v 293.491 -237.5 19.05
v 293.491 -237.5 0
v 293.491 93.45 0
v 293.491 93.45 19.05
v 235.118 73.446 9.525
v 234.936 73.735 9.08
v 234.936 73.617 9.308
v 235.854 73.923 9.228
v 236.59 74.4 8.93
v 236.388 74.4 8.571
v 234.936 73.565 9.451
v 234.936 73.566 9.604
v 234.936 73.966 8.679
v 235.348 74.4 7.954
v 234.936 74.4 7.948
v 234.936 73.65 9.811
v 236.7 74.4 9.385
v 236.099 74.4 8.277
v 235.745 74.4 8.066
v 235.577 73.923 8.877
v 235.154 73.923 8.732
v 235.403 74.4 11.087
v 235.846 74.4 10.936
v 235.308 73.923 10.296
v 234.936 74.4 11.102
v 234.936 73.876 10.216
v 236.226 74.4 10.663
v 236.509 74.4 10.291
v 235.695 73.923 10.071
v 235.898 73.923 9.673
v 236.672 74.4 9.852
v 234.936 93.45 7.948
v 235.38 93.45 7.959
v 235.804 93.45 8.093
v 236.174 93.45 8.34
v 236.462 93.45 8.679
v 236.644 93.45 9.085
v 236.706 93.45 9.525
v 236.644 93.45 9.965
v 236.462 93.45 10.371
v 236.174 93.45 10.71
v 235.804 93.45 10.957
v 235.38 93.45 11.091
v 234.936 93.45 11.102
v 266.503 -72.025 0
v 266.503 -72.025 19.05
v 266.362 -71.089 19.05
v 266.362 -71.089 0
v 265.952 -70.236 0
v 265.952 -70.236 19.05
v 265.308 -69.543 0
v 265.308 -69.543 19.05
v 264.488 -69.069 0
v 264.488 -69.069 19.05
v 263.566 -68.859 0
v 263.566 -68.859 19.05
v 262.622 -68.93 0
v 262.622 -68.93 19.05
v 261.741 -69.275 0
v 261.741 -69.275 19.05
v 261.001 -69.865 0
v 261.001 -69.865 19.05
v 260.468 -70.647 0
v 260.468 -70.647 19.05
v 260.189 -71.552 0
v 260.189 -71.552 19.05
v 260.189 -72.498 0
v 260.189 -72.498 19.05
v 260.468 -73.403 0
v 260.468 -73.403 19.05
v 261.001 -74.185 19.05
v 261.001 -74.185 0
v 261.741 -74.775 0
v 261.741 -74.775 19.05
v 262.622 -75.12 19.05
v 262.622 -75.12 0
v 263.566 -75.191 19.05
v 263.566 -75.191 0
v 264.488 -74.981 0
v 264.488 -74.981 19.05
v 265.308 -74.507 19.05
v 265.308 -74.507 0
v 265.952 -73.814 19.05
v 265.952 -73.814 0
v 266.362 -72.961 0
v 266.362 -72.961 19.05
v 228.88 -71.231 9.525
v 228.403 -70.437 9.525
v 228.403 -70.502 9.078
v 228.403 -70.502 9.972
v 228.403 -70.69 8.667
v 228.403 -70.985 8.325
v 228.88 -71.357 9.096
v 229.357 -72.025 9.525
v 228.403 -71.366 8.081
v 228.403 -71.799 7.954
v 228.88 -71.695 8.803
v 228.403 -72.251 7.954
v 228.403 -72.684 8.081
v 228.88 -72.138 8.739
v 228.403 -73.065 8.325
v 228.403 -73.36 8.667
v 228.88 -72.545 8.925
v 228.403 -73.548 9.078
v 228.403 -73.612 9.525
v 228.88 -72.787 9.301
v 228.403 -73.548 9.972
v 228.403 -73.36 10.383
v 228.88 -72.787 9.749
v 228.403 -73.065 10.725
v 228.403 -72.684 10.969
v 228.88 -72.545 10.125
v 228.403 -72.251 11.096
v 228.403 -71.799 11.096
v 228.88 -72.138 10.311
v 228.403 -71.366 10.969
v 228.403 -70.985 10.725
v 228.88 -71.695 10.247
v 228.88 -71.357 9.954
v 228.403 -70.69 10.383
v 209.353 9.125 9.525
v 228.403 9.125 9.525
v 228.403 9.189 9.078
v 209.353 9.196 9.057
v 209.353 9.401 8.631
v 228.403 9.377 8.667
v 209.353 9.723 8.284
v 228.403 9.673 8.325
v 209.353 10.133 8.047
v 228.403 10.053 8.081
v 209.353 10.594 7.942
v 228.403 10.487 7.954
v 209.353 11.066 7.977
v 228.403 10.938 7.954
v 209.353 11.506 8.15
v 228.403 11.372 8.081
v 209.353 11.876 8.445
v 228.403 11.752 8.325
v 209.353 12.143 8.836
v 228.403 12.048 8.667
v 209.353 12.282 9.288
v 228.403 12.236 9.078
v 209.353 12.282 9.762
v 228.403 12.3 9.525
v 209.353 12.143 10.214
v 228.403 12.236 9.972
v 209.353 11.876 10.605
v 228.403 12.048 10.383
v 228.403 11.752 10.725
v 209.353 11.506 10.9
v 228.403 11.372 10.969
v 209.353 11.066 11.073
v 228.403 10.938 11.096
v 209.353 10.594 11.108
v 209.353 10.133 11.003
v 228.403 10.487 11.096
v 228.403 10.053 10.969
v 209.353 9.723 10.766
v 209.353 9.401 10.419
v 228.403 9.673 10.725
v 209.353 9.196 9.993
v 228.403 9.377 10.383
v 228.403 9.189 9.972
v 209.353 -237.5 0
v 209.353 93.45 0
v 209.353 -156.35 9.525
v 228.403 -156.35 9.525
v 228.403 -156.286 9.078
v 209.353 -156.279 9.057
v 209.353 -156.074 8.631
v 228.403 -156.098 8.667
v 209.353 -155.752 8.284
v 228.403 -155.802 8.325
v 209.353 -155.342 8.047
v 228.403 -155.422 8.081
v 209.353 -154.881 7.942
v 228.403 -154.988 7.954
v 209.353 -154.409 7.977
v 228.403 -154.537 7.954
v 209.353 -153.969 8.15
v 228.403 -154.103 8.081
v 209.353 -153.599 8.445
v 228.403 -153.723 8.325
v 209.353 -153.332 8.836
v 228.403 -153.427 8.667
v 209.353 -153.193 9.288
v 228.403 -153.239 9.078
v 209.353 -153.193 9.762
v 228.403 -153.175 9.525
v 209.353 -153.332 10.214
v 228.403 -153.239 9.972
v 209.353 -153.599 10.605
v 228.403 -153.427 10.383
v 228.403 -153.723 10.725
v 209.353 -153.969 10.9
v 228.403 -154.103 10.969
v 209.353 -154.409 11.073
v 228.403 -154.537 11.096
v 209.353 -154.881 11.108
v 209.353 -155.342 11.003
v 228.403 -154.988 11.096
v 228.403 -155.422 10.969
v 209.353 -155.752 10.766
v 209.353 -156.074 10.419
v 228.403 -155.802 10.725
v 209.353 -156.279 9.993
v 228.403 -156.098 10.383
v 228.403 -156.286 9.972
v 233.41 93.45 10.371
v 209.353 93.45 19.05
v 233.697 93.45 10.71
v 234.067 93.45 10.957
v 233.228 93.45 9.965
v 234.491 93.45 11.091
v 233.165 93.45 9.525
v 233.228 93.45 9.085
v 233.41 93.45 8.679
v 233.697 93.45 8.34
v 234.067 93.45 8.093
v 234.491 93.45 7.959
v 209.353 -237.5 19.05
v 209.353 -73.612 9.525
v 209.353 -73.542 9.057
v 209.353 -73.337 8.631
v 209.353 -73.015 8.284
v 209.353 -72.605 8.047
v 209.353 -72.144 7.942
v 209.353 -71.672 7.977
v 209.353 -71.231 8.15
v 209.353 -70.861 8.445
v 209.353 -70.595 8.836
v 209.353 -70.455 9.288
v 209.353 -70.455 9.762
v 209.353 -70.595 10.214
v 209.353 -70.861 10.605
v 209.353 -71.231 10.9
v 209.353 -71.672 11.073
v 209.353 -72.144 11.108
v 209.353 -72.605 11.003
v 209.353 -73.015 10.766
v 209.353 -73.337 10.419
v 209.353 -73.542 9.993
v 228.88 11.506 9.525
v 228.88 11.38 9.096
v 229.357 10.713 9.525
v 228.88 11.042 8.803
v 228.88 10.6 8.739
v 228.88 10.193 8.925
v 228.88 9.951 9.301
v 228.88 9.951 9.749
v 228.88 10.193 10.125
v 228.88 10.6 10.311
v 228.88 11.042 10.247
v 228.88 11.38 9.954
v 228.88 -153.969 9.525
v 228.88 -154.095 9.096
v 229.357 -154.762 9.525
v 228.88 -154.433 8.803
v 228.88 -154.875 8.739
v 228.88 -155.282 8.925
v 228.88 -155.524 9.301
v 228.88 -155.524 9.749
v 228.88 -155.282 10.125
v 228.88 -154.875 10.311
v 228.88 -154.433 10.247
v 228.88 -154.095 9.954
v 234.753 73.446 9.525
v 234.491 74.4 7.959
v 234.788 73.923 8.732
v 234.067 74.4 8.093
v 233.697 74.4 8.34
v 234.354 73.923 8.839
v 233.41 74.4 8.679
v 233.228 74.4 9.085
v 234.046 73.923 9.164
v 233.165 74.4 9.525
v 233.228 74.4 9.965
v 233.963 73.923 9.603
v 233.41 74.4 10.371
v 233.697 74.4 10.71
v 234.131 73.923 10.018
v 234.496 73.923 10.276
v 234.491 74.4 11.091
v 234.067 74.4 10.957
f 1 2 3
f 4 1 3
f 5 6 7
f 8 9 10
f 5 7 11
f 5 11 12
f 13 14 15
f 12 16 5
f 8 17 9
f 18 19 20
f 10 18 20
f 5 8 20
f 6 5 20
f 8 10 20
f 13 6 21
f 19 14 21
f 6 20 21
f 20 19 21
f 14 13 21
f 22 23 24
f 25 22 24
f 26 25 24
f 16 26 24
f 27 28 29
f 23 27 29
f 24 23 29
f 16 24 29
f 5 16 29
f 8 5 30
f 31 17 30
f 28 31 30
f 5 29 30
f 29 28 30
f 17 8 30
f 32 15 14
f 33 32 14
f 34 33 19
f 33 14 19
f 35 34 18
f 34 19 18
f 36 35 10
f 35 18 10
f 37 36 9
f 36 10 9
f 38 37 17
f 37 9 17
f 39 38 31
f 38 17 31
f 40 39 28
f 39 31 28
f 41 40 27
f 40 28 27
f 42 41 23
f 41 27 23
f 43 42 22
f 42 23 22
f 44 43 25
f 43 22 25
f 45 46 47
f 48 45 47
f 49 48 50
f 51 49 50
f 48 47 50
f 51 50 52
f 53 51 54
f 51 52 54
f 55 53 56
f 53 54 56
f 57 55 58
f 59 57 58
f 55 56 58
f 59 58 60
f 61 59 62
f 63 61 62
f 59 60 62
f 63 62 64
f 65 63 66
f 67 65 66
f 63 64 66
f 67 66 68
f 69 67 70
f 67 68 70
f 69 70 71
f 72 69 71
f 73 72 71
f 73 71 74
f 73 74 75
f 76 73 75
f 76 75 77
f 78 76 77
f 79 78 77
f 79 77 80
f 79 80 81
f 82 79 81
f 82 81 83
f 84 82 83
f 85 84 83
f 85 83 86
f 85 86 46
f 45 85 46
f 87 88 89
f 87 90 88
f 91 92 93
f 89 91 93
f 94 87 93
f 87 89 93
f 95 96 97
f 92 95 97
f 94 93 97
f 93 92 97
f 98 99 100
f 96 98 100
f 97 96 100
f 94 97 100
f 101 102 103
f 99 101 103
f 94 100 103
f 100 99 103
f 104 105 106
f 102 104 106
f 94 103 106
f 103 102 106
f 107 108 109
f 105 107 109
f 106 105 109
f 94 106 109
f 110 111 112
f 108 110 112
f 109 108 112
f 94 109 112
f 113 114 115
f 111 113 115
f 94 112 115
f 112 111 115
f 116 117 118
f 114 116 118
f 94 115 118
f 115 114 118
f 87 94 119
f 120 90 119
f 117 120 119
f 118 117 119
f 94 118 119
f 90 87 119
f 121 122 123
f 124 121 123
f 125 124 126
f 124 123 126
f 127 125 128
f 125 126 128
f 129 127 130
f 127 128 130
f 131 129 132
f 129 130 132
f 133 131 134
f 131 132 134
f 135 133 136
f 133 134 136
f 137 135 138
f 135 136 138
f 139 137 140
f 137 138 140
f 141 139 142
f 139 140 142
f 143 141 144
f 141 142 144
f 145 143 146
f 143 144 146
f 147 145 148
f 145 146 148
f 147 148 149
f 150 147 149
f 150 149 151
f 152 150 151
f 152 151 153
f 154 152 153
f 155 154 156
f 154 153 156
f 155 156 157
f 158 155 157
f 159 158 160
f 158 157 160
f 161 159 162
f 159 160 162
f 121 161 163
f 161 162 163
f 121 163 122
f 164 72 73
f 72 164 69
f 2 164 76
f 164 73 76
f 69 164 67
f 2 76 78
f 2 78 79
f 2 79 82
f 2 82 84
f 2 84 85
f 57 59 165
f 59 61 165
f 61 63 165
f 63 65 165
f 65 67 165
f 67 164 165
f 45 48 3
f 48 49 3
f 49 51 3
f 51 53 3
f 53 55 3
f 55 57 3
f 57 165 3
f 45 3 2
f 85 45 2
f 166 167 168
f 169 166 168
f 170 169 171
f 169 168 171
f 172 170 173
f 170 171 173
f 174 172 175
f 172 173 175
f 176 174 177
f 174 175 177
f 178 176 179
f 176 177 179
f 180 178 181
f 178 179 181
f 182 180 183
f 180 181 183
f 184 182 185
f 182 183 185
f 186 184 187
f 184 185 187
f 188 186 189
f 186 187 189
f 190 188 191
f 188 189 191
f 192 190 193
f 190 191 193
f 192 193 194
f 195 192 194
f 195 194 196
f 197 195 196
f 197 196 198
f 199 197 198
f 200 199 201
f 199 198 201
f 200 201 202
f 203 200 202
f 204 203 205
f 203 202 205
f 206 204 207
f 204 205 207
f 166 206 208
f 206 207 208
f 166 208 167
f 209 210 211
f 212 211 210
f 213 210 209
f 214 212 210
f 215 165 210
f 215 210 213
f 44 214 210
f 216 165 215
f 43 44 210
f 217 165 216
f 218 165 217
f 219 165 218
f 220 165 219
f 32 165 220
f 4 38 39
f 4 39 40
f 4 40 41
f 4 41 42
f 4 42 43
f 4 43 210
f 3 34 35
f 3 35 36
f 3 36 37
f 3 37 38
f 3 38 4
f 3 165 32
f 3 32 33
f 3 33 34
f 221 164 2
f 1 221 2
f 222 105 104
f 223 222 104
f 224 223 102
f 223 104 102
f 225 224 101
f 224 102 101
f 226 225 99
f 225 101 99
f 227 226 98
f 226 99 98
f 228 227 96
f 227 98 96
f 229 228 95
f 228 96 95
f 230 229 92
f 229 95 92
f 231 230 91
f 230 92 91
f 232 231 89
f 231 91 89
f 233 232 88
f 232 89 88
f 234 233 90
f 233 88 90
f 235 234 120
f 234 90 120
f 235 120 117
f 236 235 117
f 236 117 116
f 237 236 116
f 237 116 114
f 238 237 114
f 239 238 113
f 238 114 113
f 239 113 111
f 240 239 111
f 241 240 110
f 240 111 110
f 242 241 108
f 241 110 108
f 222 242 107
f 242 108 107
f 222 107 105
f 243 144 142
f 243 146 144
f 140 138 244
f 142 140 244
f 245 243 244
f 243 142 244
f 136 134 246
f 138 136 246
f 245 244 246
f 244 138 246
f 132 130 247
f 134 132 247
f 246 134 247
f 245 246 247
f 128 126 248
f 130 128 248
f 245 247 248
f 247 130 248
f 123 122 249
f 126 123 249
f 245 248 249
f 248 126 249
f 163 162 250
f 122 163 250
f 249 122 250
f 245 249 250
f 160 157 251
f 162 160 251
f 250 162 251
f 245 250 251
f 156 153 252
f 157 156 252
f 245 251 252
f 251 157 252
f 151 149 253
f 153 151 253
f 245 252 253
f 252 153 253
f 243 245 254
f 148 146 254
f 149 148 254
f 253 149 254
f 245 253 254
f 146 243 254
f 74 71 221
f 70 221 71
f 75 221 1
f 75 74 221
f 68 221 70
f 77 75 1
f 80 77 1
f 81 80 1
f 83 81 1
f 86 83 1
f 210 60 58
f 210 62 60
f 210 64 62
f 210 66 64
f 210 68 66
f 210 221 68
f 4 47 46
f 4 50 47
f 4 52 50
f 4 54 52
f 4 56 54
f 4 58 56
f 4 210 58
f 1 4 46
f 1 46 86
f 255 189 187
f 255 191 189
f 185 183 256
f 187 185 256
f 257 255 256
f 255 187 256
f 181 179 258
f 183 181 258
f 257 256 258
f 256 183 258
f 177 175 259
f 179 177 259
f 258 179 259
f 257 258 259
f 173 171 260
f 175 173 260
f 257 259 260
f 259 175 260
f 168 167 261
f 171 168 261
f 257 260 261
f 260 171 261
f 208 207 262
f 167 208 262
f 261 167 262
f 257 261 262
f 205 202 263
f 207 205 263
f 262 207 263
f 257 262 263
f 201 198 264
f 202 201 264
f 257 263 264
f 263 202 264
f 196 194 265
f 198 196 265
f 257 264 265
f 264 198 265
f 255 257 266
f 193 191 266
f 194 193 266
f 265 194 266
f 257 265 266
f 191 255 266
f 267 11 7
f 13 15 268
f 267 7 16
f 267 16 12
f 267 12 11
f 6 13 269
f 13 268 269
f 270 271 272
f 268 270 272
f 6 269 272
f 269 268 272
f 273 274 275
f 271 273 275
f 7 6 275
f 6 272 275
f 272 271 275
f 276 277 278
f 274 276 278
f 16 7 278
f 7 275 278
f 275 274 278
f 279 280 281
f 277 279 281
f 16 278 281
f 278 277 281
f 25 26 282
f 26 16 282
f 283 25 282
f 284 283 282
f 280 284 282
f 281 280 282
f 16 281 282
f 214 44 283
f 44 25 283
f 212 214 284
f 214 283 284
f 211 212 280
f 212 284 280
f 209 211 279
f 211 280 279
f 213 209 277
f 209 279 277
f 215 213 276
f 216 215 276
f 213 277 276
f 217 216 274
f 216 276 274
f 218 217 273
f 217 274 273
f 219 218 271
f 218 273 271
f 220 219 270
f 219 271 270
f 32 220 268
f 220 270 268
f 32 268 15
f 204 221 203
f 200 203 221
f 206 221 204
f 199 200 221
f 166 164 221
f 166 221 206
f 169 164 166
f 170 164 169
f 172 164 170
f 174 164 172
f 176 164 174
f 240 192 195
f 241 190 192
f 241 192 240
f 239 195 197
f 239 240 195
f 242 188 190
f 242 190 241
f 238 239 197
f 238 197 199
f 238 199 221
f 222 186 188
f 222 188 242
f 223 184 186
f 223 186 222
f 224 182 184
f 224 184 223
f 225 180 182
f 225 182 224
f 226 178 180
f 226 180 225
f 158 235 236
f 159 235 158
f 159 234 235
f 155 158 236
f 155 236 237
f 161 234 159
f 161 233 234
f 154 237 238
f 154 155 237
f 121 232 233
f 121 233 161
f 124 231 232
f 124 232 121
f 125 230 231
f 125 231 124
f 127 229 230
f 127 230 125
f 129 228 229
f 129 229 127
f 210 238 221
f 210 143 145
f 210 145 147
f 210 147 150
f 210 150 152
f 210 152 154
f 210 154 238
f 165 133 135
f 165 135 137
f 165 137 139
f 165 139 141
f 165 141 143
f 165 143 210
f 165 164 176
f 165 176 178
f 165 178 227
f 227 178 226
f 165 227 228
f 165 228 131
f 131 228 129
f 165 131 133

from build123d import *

# Parameters (mm, degrees)
SKETCH1_W                   = 84.137862113
SKETCH1_H                   = 330.949999988
BOSS_EXTRUDE1_DEPTH         = 19.05
HOLE1_D                     = 3.175
HOLE1_DEPTH                 = 31.75
HOLE1_CSINK_D               = 10.16
HOLE1_CSINK_ANGLE           = 82
HOLE1_TIP                   = 0.953866233
HOLE3_D                     = 3.175
HOLE3_DEPTH                 = 38.1
HOLE3_CSINK_D               = 10.16
HOLE3_CSINK_ANGLE           = 82
HOLE3_TIP                   = 0.953866233
F_1_4_0_25_DIAMETER_HOLE1_D = 6.35
HOLE4_D                     = 3.175
HOLE4_DEPTH                 = 31.75
HOLE4_CSINK_D               = 10.16
HOLE4_CSINK_ANGLE           = 82
HOLE4_TIP                   = 0.953866233
HOLE5_D                     = 3.175
HOLE5_DEPTH                 = 38.1
HOLE5_CSINK_D               = 10.16
HOLE5_CSINK_ANGLE           = 82
HOLE5_TIP                   = 0.953866233


with BuildPart() as part:
    # Sketch1 → Boss-Extrude1 (new body)
    with BuildSketch(Plane.XY):
        with Locations((251.421898238, -72.024999997)):
            Rectangle(SKETCH1_W, SKETCH1_H)
    extrude(amount=BOSS_EXTRUDE1_DEPTH)

    # Hole1
    with Locations(Plane(origin=(196.652967181, -72.024999997, 386.262770337), x_dir=(0, 1, 0), z_dir=(-1, 0, 0))):
        with Locations((174.999999994, 685.961004241), (174.999999994, 549.837259632), (174.999999994, 413.713515022), (81.549999997, 779.649723129), (81.549999997, 652.344645962), (62.499999997, 662.953402392), (62.499999997, 769.040966698), (-62.499999997, 769.040966698), (-62.499999997, 662.953402392), (-81.549999997, 652.344645962), (-81.549999997, 779.649723129), (-174.999999994, 413.713515022), (-174.999999994, 549.837259632), (-174.999999994, 685.961004241), (-82.737499997, 600.384620239), (0, 600.384620239), (82.737499997, 600.384620239), (0, 376.737770337), (-82.737499997, 376.737770337), (82.737499997, 376.737770337)):
            CounterSinkHole(HOLE1_D / 2, HOLE1_CSINK_D / 2, depth=HOLE1_DEPTH, counter_sink_angle=HOLE1_CSINK_ANGLE)
            with Locations((0, 0, -(HOLE1_DEPTH + HOLE1_TIP / 2))):  # 118° drill point
                Cone(0, HOLE1_D / 2, HOLE1_TIP, mode=Mode.SUBTRACT)

    # Hole3
    with Locations(Plane(origin=(-181.039434513, 112.499999997, 386.262770337), x_dir=(0.9271838545667855, -1.3196841813264566e-15, -0.37460659341591657), z_dir=(0, 1, 0))):
        with Locations((46.221112845, 113.488854888), (39.39759596, 37.945520226), (412.28786892, 80.423559293), (407.308516105, 25.297013484), (513.561319184, 161.164706775), (597.46020397, 127.267357003), (610.543339245, 159.649253123), (694.322923815, 367.011001477), (526.644454459, 193.546602895), (610.424039029, 400.908351249)):
            CounterSinkHole(HOLE3_D / 2, HOLE3_CSINK_D / 2, depth=HOLE3_DEPTH, counter_sink_angle=HOLE3_CSINK_ANGLE)
            with Locations((0, 0, -(HOLE3_DEPTH + HOLE3_TIP / 2))):  # 118° drill point
                Cone(0, HOLE3_D / 2, HOLE3_TIP, mode=Mode.SUBTRACT)

    # 1/4 (0.25) Diameter Hole1 (through all)
    with Locations(Plane(origin=(0, 0, 0), x_dir=(-1, 0, 0), z_dir=(0, 0, -1))):
        with Locations((-263.328329294, -72.024999997)):
            Hole(F_1_4_0_25_DIAMETER_HOLE1_D / 2)

    # Hole4
    with Locations(Plane(origin=(196.652967181, -72.024999997, 609.90962024), x_dir=(0, 1, 0), z_dir=(-1, 0, 0))):
        with Locations((174.999999994, 685.961004241), (174.999999994, 549.837259632), (174.999999994, 413.713515022), (81.549999997, 779.649723129), (81.549999997, 652.344645962), (62.499999997, 662.953402392), (62.499999997, 769.040966698), (-62.499999997, 769.040966698), (-62.499999997, 662.953402392), (-81.549999997, 652.344645962), (-81.549999997, 779.649723129), (-174.999999994, 413.713515022), (-174.999999994, 549.837259632), (-174.999999994, 685.961004241), (-82.737499997, 600.384620239), (0, 600.384620239), (82.737499997, 600.384620239), (0, 376.737770337), (-82.737499997, 376.737770337), (82.737499997, 376.737770337)):
            CounterSinkHole(HOLE4_D / 2, HOLE4_CSINK_D / 2, depth=HOLE4_DEPTH, counter_sink_angle=HOLE4_CSINK_ANGLE)
            with Locations((0, 0, -(HOLE4_DEPTH + HOLE4_TIP / 2))):  # 118° drill point
                Cone(0, HOLE4_D / 2, HOLE4_TIP, mode=Mode.SUBTRACT)

    # Hole5
    with Locations(Plane(origin=(-181.039434513, 112.499999997, 609.90962024), x_dir=(0.9271838545667913, -6.190403823971236e-15, -0.3746065934159023), z_dir=(0, 1, 0))):
        with Locations((46.221112845, 113.488854888), (39.39759596, 37.945520226), (412.28786892, 80.423559293), (407.308516105, 25.297013484), (513.561319184, 161.164706775), (597.46020397, 127.267357003), (610.413630265, 158.37956732), (694.652415845, 366.877878057), (526.881492954, 193.157790175), (610.762859894, 400.771458735)):
            CounterSinkHole(HOLE5_D / 2, HOLE5_CSINK_D / 2, depth=HOLE5_DEPTH, counter_sink_angle=HOLE5_CSINK_ANGLE)
            with Locations((0, 0, -(HOLE5_DEPTH + HOLE5_TIP / 2))):  # 118° drill point
                Cone(0, HOLE5_D / 2, HOLE5_TIP, mode=Mode.SUBTRACT)


solid = part.part
